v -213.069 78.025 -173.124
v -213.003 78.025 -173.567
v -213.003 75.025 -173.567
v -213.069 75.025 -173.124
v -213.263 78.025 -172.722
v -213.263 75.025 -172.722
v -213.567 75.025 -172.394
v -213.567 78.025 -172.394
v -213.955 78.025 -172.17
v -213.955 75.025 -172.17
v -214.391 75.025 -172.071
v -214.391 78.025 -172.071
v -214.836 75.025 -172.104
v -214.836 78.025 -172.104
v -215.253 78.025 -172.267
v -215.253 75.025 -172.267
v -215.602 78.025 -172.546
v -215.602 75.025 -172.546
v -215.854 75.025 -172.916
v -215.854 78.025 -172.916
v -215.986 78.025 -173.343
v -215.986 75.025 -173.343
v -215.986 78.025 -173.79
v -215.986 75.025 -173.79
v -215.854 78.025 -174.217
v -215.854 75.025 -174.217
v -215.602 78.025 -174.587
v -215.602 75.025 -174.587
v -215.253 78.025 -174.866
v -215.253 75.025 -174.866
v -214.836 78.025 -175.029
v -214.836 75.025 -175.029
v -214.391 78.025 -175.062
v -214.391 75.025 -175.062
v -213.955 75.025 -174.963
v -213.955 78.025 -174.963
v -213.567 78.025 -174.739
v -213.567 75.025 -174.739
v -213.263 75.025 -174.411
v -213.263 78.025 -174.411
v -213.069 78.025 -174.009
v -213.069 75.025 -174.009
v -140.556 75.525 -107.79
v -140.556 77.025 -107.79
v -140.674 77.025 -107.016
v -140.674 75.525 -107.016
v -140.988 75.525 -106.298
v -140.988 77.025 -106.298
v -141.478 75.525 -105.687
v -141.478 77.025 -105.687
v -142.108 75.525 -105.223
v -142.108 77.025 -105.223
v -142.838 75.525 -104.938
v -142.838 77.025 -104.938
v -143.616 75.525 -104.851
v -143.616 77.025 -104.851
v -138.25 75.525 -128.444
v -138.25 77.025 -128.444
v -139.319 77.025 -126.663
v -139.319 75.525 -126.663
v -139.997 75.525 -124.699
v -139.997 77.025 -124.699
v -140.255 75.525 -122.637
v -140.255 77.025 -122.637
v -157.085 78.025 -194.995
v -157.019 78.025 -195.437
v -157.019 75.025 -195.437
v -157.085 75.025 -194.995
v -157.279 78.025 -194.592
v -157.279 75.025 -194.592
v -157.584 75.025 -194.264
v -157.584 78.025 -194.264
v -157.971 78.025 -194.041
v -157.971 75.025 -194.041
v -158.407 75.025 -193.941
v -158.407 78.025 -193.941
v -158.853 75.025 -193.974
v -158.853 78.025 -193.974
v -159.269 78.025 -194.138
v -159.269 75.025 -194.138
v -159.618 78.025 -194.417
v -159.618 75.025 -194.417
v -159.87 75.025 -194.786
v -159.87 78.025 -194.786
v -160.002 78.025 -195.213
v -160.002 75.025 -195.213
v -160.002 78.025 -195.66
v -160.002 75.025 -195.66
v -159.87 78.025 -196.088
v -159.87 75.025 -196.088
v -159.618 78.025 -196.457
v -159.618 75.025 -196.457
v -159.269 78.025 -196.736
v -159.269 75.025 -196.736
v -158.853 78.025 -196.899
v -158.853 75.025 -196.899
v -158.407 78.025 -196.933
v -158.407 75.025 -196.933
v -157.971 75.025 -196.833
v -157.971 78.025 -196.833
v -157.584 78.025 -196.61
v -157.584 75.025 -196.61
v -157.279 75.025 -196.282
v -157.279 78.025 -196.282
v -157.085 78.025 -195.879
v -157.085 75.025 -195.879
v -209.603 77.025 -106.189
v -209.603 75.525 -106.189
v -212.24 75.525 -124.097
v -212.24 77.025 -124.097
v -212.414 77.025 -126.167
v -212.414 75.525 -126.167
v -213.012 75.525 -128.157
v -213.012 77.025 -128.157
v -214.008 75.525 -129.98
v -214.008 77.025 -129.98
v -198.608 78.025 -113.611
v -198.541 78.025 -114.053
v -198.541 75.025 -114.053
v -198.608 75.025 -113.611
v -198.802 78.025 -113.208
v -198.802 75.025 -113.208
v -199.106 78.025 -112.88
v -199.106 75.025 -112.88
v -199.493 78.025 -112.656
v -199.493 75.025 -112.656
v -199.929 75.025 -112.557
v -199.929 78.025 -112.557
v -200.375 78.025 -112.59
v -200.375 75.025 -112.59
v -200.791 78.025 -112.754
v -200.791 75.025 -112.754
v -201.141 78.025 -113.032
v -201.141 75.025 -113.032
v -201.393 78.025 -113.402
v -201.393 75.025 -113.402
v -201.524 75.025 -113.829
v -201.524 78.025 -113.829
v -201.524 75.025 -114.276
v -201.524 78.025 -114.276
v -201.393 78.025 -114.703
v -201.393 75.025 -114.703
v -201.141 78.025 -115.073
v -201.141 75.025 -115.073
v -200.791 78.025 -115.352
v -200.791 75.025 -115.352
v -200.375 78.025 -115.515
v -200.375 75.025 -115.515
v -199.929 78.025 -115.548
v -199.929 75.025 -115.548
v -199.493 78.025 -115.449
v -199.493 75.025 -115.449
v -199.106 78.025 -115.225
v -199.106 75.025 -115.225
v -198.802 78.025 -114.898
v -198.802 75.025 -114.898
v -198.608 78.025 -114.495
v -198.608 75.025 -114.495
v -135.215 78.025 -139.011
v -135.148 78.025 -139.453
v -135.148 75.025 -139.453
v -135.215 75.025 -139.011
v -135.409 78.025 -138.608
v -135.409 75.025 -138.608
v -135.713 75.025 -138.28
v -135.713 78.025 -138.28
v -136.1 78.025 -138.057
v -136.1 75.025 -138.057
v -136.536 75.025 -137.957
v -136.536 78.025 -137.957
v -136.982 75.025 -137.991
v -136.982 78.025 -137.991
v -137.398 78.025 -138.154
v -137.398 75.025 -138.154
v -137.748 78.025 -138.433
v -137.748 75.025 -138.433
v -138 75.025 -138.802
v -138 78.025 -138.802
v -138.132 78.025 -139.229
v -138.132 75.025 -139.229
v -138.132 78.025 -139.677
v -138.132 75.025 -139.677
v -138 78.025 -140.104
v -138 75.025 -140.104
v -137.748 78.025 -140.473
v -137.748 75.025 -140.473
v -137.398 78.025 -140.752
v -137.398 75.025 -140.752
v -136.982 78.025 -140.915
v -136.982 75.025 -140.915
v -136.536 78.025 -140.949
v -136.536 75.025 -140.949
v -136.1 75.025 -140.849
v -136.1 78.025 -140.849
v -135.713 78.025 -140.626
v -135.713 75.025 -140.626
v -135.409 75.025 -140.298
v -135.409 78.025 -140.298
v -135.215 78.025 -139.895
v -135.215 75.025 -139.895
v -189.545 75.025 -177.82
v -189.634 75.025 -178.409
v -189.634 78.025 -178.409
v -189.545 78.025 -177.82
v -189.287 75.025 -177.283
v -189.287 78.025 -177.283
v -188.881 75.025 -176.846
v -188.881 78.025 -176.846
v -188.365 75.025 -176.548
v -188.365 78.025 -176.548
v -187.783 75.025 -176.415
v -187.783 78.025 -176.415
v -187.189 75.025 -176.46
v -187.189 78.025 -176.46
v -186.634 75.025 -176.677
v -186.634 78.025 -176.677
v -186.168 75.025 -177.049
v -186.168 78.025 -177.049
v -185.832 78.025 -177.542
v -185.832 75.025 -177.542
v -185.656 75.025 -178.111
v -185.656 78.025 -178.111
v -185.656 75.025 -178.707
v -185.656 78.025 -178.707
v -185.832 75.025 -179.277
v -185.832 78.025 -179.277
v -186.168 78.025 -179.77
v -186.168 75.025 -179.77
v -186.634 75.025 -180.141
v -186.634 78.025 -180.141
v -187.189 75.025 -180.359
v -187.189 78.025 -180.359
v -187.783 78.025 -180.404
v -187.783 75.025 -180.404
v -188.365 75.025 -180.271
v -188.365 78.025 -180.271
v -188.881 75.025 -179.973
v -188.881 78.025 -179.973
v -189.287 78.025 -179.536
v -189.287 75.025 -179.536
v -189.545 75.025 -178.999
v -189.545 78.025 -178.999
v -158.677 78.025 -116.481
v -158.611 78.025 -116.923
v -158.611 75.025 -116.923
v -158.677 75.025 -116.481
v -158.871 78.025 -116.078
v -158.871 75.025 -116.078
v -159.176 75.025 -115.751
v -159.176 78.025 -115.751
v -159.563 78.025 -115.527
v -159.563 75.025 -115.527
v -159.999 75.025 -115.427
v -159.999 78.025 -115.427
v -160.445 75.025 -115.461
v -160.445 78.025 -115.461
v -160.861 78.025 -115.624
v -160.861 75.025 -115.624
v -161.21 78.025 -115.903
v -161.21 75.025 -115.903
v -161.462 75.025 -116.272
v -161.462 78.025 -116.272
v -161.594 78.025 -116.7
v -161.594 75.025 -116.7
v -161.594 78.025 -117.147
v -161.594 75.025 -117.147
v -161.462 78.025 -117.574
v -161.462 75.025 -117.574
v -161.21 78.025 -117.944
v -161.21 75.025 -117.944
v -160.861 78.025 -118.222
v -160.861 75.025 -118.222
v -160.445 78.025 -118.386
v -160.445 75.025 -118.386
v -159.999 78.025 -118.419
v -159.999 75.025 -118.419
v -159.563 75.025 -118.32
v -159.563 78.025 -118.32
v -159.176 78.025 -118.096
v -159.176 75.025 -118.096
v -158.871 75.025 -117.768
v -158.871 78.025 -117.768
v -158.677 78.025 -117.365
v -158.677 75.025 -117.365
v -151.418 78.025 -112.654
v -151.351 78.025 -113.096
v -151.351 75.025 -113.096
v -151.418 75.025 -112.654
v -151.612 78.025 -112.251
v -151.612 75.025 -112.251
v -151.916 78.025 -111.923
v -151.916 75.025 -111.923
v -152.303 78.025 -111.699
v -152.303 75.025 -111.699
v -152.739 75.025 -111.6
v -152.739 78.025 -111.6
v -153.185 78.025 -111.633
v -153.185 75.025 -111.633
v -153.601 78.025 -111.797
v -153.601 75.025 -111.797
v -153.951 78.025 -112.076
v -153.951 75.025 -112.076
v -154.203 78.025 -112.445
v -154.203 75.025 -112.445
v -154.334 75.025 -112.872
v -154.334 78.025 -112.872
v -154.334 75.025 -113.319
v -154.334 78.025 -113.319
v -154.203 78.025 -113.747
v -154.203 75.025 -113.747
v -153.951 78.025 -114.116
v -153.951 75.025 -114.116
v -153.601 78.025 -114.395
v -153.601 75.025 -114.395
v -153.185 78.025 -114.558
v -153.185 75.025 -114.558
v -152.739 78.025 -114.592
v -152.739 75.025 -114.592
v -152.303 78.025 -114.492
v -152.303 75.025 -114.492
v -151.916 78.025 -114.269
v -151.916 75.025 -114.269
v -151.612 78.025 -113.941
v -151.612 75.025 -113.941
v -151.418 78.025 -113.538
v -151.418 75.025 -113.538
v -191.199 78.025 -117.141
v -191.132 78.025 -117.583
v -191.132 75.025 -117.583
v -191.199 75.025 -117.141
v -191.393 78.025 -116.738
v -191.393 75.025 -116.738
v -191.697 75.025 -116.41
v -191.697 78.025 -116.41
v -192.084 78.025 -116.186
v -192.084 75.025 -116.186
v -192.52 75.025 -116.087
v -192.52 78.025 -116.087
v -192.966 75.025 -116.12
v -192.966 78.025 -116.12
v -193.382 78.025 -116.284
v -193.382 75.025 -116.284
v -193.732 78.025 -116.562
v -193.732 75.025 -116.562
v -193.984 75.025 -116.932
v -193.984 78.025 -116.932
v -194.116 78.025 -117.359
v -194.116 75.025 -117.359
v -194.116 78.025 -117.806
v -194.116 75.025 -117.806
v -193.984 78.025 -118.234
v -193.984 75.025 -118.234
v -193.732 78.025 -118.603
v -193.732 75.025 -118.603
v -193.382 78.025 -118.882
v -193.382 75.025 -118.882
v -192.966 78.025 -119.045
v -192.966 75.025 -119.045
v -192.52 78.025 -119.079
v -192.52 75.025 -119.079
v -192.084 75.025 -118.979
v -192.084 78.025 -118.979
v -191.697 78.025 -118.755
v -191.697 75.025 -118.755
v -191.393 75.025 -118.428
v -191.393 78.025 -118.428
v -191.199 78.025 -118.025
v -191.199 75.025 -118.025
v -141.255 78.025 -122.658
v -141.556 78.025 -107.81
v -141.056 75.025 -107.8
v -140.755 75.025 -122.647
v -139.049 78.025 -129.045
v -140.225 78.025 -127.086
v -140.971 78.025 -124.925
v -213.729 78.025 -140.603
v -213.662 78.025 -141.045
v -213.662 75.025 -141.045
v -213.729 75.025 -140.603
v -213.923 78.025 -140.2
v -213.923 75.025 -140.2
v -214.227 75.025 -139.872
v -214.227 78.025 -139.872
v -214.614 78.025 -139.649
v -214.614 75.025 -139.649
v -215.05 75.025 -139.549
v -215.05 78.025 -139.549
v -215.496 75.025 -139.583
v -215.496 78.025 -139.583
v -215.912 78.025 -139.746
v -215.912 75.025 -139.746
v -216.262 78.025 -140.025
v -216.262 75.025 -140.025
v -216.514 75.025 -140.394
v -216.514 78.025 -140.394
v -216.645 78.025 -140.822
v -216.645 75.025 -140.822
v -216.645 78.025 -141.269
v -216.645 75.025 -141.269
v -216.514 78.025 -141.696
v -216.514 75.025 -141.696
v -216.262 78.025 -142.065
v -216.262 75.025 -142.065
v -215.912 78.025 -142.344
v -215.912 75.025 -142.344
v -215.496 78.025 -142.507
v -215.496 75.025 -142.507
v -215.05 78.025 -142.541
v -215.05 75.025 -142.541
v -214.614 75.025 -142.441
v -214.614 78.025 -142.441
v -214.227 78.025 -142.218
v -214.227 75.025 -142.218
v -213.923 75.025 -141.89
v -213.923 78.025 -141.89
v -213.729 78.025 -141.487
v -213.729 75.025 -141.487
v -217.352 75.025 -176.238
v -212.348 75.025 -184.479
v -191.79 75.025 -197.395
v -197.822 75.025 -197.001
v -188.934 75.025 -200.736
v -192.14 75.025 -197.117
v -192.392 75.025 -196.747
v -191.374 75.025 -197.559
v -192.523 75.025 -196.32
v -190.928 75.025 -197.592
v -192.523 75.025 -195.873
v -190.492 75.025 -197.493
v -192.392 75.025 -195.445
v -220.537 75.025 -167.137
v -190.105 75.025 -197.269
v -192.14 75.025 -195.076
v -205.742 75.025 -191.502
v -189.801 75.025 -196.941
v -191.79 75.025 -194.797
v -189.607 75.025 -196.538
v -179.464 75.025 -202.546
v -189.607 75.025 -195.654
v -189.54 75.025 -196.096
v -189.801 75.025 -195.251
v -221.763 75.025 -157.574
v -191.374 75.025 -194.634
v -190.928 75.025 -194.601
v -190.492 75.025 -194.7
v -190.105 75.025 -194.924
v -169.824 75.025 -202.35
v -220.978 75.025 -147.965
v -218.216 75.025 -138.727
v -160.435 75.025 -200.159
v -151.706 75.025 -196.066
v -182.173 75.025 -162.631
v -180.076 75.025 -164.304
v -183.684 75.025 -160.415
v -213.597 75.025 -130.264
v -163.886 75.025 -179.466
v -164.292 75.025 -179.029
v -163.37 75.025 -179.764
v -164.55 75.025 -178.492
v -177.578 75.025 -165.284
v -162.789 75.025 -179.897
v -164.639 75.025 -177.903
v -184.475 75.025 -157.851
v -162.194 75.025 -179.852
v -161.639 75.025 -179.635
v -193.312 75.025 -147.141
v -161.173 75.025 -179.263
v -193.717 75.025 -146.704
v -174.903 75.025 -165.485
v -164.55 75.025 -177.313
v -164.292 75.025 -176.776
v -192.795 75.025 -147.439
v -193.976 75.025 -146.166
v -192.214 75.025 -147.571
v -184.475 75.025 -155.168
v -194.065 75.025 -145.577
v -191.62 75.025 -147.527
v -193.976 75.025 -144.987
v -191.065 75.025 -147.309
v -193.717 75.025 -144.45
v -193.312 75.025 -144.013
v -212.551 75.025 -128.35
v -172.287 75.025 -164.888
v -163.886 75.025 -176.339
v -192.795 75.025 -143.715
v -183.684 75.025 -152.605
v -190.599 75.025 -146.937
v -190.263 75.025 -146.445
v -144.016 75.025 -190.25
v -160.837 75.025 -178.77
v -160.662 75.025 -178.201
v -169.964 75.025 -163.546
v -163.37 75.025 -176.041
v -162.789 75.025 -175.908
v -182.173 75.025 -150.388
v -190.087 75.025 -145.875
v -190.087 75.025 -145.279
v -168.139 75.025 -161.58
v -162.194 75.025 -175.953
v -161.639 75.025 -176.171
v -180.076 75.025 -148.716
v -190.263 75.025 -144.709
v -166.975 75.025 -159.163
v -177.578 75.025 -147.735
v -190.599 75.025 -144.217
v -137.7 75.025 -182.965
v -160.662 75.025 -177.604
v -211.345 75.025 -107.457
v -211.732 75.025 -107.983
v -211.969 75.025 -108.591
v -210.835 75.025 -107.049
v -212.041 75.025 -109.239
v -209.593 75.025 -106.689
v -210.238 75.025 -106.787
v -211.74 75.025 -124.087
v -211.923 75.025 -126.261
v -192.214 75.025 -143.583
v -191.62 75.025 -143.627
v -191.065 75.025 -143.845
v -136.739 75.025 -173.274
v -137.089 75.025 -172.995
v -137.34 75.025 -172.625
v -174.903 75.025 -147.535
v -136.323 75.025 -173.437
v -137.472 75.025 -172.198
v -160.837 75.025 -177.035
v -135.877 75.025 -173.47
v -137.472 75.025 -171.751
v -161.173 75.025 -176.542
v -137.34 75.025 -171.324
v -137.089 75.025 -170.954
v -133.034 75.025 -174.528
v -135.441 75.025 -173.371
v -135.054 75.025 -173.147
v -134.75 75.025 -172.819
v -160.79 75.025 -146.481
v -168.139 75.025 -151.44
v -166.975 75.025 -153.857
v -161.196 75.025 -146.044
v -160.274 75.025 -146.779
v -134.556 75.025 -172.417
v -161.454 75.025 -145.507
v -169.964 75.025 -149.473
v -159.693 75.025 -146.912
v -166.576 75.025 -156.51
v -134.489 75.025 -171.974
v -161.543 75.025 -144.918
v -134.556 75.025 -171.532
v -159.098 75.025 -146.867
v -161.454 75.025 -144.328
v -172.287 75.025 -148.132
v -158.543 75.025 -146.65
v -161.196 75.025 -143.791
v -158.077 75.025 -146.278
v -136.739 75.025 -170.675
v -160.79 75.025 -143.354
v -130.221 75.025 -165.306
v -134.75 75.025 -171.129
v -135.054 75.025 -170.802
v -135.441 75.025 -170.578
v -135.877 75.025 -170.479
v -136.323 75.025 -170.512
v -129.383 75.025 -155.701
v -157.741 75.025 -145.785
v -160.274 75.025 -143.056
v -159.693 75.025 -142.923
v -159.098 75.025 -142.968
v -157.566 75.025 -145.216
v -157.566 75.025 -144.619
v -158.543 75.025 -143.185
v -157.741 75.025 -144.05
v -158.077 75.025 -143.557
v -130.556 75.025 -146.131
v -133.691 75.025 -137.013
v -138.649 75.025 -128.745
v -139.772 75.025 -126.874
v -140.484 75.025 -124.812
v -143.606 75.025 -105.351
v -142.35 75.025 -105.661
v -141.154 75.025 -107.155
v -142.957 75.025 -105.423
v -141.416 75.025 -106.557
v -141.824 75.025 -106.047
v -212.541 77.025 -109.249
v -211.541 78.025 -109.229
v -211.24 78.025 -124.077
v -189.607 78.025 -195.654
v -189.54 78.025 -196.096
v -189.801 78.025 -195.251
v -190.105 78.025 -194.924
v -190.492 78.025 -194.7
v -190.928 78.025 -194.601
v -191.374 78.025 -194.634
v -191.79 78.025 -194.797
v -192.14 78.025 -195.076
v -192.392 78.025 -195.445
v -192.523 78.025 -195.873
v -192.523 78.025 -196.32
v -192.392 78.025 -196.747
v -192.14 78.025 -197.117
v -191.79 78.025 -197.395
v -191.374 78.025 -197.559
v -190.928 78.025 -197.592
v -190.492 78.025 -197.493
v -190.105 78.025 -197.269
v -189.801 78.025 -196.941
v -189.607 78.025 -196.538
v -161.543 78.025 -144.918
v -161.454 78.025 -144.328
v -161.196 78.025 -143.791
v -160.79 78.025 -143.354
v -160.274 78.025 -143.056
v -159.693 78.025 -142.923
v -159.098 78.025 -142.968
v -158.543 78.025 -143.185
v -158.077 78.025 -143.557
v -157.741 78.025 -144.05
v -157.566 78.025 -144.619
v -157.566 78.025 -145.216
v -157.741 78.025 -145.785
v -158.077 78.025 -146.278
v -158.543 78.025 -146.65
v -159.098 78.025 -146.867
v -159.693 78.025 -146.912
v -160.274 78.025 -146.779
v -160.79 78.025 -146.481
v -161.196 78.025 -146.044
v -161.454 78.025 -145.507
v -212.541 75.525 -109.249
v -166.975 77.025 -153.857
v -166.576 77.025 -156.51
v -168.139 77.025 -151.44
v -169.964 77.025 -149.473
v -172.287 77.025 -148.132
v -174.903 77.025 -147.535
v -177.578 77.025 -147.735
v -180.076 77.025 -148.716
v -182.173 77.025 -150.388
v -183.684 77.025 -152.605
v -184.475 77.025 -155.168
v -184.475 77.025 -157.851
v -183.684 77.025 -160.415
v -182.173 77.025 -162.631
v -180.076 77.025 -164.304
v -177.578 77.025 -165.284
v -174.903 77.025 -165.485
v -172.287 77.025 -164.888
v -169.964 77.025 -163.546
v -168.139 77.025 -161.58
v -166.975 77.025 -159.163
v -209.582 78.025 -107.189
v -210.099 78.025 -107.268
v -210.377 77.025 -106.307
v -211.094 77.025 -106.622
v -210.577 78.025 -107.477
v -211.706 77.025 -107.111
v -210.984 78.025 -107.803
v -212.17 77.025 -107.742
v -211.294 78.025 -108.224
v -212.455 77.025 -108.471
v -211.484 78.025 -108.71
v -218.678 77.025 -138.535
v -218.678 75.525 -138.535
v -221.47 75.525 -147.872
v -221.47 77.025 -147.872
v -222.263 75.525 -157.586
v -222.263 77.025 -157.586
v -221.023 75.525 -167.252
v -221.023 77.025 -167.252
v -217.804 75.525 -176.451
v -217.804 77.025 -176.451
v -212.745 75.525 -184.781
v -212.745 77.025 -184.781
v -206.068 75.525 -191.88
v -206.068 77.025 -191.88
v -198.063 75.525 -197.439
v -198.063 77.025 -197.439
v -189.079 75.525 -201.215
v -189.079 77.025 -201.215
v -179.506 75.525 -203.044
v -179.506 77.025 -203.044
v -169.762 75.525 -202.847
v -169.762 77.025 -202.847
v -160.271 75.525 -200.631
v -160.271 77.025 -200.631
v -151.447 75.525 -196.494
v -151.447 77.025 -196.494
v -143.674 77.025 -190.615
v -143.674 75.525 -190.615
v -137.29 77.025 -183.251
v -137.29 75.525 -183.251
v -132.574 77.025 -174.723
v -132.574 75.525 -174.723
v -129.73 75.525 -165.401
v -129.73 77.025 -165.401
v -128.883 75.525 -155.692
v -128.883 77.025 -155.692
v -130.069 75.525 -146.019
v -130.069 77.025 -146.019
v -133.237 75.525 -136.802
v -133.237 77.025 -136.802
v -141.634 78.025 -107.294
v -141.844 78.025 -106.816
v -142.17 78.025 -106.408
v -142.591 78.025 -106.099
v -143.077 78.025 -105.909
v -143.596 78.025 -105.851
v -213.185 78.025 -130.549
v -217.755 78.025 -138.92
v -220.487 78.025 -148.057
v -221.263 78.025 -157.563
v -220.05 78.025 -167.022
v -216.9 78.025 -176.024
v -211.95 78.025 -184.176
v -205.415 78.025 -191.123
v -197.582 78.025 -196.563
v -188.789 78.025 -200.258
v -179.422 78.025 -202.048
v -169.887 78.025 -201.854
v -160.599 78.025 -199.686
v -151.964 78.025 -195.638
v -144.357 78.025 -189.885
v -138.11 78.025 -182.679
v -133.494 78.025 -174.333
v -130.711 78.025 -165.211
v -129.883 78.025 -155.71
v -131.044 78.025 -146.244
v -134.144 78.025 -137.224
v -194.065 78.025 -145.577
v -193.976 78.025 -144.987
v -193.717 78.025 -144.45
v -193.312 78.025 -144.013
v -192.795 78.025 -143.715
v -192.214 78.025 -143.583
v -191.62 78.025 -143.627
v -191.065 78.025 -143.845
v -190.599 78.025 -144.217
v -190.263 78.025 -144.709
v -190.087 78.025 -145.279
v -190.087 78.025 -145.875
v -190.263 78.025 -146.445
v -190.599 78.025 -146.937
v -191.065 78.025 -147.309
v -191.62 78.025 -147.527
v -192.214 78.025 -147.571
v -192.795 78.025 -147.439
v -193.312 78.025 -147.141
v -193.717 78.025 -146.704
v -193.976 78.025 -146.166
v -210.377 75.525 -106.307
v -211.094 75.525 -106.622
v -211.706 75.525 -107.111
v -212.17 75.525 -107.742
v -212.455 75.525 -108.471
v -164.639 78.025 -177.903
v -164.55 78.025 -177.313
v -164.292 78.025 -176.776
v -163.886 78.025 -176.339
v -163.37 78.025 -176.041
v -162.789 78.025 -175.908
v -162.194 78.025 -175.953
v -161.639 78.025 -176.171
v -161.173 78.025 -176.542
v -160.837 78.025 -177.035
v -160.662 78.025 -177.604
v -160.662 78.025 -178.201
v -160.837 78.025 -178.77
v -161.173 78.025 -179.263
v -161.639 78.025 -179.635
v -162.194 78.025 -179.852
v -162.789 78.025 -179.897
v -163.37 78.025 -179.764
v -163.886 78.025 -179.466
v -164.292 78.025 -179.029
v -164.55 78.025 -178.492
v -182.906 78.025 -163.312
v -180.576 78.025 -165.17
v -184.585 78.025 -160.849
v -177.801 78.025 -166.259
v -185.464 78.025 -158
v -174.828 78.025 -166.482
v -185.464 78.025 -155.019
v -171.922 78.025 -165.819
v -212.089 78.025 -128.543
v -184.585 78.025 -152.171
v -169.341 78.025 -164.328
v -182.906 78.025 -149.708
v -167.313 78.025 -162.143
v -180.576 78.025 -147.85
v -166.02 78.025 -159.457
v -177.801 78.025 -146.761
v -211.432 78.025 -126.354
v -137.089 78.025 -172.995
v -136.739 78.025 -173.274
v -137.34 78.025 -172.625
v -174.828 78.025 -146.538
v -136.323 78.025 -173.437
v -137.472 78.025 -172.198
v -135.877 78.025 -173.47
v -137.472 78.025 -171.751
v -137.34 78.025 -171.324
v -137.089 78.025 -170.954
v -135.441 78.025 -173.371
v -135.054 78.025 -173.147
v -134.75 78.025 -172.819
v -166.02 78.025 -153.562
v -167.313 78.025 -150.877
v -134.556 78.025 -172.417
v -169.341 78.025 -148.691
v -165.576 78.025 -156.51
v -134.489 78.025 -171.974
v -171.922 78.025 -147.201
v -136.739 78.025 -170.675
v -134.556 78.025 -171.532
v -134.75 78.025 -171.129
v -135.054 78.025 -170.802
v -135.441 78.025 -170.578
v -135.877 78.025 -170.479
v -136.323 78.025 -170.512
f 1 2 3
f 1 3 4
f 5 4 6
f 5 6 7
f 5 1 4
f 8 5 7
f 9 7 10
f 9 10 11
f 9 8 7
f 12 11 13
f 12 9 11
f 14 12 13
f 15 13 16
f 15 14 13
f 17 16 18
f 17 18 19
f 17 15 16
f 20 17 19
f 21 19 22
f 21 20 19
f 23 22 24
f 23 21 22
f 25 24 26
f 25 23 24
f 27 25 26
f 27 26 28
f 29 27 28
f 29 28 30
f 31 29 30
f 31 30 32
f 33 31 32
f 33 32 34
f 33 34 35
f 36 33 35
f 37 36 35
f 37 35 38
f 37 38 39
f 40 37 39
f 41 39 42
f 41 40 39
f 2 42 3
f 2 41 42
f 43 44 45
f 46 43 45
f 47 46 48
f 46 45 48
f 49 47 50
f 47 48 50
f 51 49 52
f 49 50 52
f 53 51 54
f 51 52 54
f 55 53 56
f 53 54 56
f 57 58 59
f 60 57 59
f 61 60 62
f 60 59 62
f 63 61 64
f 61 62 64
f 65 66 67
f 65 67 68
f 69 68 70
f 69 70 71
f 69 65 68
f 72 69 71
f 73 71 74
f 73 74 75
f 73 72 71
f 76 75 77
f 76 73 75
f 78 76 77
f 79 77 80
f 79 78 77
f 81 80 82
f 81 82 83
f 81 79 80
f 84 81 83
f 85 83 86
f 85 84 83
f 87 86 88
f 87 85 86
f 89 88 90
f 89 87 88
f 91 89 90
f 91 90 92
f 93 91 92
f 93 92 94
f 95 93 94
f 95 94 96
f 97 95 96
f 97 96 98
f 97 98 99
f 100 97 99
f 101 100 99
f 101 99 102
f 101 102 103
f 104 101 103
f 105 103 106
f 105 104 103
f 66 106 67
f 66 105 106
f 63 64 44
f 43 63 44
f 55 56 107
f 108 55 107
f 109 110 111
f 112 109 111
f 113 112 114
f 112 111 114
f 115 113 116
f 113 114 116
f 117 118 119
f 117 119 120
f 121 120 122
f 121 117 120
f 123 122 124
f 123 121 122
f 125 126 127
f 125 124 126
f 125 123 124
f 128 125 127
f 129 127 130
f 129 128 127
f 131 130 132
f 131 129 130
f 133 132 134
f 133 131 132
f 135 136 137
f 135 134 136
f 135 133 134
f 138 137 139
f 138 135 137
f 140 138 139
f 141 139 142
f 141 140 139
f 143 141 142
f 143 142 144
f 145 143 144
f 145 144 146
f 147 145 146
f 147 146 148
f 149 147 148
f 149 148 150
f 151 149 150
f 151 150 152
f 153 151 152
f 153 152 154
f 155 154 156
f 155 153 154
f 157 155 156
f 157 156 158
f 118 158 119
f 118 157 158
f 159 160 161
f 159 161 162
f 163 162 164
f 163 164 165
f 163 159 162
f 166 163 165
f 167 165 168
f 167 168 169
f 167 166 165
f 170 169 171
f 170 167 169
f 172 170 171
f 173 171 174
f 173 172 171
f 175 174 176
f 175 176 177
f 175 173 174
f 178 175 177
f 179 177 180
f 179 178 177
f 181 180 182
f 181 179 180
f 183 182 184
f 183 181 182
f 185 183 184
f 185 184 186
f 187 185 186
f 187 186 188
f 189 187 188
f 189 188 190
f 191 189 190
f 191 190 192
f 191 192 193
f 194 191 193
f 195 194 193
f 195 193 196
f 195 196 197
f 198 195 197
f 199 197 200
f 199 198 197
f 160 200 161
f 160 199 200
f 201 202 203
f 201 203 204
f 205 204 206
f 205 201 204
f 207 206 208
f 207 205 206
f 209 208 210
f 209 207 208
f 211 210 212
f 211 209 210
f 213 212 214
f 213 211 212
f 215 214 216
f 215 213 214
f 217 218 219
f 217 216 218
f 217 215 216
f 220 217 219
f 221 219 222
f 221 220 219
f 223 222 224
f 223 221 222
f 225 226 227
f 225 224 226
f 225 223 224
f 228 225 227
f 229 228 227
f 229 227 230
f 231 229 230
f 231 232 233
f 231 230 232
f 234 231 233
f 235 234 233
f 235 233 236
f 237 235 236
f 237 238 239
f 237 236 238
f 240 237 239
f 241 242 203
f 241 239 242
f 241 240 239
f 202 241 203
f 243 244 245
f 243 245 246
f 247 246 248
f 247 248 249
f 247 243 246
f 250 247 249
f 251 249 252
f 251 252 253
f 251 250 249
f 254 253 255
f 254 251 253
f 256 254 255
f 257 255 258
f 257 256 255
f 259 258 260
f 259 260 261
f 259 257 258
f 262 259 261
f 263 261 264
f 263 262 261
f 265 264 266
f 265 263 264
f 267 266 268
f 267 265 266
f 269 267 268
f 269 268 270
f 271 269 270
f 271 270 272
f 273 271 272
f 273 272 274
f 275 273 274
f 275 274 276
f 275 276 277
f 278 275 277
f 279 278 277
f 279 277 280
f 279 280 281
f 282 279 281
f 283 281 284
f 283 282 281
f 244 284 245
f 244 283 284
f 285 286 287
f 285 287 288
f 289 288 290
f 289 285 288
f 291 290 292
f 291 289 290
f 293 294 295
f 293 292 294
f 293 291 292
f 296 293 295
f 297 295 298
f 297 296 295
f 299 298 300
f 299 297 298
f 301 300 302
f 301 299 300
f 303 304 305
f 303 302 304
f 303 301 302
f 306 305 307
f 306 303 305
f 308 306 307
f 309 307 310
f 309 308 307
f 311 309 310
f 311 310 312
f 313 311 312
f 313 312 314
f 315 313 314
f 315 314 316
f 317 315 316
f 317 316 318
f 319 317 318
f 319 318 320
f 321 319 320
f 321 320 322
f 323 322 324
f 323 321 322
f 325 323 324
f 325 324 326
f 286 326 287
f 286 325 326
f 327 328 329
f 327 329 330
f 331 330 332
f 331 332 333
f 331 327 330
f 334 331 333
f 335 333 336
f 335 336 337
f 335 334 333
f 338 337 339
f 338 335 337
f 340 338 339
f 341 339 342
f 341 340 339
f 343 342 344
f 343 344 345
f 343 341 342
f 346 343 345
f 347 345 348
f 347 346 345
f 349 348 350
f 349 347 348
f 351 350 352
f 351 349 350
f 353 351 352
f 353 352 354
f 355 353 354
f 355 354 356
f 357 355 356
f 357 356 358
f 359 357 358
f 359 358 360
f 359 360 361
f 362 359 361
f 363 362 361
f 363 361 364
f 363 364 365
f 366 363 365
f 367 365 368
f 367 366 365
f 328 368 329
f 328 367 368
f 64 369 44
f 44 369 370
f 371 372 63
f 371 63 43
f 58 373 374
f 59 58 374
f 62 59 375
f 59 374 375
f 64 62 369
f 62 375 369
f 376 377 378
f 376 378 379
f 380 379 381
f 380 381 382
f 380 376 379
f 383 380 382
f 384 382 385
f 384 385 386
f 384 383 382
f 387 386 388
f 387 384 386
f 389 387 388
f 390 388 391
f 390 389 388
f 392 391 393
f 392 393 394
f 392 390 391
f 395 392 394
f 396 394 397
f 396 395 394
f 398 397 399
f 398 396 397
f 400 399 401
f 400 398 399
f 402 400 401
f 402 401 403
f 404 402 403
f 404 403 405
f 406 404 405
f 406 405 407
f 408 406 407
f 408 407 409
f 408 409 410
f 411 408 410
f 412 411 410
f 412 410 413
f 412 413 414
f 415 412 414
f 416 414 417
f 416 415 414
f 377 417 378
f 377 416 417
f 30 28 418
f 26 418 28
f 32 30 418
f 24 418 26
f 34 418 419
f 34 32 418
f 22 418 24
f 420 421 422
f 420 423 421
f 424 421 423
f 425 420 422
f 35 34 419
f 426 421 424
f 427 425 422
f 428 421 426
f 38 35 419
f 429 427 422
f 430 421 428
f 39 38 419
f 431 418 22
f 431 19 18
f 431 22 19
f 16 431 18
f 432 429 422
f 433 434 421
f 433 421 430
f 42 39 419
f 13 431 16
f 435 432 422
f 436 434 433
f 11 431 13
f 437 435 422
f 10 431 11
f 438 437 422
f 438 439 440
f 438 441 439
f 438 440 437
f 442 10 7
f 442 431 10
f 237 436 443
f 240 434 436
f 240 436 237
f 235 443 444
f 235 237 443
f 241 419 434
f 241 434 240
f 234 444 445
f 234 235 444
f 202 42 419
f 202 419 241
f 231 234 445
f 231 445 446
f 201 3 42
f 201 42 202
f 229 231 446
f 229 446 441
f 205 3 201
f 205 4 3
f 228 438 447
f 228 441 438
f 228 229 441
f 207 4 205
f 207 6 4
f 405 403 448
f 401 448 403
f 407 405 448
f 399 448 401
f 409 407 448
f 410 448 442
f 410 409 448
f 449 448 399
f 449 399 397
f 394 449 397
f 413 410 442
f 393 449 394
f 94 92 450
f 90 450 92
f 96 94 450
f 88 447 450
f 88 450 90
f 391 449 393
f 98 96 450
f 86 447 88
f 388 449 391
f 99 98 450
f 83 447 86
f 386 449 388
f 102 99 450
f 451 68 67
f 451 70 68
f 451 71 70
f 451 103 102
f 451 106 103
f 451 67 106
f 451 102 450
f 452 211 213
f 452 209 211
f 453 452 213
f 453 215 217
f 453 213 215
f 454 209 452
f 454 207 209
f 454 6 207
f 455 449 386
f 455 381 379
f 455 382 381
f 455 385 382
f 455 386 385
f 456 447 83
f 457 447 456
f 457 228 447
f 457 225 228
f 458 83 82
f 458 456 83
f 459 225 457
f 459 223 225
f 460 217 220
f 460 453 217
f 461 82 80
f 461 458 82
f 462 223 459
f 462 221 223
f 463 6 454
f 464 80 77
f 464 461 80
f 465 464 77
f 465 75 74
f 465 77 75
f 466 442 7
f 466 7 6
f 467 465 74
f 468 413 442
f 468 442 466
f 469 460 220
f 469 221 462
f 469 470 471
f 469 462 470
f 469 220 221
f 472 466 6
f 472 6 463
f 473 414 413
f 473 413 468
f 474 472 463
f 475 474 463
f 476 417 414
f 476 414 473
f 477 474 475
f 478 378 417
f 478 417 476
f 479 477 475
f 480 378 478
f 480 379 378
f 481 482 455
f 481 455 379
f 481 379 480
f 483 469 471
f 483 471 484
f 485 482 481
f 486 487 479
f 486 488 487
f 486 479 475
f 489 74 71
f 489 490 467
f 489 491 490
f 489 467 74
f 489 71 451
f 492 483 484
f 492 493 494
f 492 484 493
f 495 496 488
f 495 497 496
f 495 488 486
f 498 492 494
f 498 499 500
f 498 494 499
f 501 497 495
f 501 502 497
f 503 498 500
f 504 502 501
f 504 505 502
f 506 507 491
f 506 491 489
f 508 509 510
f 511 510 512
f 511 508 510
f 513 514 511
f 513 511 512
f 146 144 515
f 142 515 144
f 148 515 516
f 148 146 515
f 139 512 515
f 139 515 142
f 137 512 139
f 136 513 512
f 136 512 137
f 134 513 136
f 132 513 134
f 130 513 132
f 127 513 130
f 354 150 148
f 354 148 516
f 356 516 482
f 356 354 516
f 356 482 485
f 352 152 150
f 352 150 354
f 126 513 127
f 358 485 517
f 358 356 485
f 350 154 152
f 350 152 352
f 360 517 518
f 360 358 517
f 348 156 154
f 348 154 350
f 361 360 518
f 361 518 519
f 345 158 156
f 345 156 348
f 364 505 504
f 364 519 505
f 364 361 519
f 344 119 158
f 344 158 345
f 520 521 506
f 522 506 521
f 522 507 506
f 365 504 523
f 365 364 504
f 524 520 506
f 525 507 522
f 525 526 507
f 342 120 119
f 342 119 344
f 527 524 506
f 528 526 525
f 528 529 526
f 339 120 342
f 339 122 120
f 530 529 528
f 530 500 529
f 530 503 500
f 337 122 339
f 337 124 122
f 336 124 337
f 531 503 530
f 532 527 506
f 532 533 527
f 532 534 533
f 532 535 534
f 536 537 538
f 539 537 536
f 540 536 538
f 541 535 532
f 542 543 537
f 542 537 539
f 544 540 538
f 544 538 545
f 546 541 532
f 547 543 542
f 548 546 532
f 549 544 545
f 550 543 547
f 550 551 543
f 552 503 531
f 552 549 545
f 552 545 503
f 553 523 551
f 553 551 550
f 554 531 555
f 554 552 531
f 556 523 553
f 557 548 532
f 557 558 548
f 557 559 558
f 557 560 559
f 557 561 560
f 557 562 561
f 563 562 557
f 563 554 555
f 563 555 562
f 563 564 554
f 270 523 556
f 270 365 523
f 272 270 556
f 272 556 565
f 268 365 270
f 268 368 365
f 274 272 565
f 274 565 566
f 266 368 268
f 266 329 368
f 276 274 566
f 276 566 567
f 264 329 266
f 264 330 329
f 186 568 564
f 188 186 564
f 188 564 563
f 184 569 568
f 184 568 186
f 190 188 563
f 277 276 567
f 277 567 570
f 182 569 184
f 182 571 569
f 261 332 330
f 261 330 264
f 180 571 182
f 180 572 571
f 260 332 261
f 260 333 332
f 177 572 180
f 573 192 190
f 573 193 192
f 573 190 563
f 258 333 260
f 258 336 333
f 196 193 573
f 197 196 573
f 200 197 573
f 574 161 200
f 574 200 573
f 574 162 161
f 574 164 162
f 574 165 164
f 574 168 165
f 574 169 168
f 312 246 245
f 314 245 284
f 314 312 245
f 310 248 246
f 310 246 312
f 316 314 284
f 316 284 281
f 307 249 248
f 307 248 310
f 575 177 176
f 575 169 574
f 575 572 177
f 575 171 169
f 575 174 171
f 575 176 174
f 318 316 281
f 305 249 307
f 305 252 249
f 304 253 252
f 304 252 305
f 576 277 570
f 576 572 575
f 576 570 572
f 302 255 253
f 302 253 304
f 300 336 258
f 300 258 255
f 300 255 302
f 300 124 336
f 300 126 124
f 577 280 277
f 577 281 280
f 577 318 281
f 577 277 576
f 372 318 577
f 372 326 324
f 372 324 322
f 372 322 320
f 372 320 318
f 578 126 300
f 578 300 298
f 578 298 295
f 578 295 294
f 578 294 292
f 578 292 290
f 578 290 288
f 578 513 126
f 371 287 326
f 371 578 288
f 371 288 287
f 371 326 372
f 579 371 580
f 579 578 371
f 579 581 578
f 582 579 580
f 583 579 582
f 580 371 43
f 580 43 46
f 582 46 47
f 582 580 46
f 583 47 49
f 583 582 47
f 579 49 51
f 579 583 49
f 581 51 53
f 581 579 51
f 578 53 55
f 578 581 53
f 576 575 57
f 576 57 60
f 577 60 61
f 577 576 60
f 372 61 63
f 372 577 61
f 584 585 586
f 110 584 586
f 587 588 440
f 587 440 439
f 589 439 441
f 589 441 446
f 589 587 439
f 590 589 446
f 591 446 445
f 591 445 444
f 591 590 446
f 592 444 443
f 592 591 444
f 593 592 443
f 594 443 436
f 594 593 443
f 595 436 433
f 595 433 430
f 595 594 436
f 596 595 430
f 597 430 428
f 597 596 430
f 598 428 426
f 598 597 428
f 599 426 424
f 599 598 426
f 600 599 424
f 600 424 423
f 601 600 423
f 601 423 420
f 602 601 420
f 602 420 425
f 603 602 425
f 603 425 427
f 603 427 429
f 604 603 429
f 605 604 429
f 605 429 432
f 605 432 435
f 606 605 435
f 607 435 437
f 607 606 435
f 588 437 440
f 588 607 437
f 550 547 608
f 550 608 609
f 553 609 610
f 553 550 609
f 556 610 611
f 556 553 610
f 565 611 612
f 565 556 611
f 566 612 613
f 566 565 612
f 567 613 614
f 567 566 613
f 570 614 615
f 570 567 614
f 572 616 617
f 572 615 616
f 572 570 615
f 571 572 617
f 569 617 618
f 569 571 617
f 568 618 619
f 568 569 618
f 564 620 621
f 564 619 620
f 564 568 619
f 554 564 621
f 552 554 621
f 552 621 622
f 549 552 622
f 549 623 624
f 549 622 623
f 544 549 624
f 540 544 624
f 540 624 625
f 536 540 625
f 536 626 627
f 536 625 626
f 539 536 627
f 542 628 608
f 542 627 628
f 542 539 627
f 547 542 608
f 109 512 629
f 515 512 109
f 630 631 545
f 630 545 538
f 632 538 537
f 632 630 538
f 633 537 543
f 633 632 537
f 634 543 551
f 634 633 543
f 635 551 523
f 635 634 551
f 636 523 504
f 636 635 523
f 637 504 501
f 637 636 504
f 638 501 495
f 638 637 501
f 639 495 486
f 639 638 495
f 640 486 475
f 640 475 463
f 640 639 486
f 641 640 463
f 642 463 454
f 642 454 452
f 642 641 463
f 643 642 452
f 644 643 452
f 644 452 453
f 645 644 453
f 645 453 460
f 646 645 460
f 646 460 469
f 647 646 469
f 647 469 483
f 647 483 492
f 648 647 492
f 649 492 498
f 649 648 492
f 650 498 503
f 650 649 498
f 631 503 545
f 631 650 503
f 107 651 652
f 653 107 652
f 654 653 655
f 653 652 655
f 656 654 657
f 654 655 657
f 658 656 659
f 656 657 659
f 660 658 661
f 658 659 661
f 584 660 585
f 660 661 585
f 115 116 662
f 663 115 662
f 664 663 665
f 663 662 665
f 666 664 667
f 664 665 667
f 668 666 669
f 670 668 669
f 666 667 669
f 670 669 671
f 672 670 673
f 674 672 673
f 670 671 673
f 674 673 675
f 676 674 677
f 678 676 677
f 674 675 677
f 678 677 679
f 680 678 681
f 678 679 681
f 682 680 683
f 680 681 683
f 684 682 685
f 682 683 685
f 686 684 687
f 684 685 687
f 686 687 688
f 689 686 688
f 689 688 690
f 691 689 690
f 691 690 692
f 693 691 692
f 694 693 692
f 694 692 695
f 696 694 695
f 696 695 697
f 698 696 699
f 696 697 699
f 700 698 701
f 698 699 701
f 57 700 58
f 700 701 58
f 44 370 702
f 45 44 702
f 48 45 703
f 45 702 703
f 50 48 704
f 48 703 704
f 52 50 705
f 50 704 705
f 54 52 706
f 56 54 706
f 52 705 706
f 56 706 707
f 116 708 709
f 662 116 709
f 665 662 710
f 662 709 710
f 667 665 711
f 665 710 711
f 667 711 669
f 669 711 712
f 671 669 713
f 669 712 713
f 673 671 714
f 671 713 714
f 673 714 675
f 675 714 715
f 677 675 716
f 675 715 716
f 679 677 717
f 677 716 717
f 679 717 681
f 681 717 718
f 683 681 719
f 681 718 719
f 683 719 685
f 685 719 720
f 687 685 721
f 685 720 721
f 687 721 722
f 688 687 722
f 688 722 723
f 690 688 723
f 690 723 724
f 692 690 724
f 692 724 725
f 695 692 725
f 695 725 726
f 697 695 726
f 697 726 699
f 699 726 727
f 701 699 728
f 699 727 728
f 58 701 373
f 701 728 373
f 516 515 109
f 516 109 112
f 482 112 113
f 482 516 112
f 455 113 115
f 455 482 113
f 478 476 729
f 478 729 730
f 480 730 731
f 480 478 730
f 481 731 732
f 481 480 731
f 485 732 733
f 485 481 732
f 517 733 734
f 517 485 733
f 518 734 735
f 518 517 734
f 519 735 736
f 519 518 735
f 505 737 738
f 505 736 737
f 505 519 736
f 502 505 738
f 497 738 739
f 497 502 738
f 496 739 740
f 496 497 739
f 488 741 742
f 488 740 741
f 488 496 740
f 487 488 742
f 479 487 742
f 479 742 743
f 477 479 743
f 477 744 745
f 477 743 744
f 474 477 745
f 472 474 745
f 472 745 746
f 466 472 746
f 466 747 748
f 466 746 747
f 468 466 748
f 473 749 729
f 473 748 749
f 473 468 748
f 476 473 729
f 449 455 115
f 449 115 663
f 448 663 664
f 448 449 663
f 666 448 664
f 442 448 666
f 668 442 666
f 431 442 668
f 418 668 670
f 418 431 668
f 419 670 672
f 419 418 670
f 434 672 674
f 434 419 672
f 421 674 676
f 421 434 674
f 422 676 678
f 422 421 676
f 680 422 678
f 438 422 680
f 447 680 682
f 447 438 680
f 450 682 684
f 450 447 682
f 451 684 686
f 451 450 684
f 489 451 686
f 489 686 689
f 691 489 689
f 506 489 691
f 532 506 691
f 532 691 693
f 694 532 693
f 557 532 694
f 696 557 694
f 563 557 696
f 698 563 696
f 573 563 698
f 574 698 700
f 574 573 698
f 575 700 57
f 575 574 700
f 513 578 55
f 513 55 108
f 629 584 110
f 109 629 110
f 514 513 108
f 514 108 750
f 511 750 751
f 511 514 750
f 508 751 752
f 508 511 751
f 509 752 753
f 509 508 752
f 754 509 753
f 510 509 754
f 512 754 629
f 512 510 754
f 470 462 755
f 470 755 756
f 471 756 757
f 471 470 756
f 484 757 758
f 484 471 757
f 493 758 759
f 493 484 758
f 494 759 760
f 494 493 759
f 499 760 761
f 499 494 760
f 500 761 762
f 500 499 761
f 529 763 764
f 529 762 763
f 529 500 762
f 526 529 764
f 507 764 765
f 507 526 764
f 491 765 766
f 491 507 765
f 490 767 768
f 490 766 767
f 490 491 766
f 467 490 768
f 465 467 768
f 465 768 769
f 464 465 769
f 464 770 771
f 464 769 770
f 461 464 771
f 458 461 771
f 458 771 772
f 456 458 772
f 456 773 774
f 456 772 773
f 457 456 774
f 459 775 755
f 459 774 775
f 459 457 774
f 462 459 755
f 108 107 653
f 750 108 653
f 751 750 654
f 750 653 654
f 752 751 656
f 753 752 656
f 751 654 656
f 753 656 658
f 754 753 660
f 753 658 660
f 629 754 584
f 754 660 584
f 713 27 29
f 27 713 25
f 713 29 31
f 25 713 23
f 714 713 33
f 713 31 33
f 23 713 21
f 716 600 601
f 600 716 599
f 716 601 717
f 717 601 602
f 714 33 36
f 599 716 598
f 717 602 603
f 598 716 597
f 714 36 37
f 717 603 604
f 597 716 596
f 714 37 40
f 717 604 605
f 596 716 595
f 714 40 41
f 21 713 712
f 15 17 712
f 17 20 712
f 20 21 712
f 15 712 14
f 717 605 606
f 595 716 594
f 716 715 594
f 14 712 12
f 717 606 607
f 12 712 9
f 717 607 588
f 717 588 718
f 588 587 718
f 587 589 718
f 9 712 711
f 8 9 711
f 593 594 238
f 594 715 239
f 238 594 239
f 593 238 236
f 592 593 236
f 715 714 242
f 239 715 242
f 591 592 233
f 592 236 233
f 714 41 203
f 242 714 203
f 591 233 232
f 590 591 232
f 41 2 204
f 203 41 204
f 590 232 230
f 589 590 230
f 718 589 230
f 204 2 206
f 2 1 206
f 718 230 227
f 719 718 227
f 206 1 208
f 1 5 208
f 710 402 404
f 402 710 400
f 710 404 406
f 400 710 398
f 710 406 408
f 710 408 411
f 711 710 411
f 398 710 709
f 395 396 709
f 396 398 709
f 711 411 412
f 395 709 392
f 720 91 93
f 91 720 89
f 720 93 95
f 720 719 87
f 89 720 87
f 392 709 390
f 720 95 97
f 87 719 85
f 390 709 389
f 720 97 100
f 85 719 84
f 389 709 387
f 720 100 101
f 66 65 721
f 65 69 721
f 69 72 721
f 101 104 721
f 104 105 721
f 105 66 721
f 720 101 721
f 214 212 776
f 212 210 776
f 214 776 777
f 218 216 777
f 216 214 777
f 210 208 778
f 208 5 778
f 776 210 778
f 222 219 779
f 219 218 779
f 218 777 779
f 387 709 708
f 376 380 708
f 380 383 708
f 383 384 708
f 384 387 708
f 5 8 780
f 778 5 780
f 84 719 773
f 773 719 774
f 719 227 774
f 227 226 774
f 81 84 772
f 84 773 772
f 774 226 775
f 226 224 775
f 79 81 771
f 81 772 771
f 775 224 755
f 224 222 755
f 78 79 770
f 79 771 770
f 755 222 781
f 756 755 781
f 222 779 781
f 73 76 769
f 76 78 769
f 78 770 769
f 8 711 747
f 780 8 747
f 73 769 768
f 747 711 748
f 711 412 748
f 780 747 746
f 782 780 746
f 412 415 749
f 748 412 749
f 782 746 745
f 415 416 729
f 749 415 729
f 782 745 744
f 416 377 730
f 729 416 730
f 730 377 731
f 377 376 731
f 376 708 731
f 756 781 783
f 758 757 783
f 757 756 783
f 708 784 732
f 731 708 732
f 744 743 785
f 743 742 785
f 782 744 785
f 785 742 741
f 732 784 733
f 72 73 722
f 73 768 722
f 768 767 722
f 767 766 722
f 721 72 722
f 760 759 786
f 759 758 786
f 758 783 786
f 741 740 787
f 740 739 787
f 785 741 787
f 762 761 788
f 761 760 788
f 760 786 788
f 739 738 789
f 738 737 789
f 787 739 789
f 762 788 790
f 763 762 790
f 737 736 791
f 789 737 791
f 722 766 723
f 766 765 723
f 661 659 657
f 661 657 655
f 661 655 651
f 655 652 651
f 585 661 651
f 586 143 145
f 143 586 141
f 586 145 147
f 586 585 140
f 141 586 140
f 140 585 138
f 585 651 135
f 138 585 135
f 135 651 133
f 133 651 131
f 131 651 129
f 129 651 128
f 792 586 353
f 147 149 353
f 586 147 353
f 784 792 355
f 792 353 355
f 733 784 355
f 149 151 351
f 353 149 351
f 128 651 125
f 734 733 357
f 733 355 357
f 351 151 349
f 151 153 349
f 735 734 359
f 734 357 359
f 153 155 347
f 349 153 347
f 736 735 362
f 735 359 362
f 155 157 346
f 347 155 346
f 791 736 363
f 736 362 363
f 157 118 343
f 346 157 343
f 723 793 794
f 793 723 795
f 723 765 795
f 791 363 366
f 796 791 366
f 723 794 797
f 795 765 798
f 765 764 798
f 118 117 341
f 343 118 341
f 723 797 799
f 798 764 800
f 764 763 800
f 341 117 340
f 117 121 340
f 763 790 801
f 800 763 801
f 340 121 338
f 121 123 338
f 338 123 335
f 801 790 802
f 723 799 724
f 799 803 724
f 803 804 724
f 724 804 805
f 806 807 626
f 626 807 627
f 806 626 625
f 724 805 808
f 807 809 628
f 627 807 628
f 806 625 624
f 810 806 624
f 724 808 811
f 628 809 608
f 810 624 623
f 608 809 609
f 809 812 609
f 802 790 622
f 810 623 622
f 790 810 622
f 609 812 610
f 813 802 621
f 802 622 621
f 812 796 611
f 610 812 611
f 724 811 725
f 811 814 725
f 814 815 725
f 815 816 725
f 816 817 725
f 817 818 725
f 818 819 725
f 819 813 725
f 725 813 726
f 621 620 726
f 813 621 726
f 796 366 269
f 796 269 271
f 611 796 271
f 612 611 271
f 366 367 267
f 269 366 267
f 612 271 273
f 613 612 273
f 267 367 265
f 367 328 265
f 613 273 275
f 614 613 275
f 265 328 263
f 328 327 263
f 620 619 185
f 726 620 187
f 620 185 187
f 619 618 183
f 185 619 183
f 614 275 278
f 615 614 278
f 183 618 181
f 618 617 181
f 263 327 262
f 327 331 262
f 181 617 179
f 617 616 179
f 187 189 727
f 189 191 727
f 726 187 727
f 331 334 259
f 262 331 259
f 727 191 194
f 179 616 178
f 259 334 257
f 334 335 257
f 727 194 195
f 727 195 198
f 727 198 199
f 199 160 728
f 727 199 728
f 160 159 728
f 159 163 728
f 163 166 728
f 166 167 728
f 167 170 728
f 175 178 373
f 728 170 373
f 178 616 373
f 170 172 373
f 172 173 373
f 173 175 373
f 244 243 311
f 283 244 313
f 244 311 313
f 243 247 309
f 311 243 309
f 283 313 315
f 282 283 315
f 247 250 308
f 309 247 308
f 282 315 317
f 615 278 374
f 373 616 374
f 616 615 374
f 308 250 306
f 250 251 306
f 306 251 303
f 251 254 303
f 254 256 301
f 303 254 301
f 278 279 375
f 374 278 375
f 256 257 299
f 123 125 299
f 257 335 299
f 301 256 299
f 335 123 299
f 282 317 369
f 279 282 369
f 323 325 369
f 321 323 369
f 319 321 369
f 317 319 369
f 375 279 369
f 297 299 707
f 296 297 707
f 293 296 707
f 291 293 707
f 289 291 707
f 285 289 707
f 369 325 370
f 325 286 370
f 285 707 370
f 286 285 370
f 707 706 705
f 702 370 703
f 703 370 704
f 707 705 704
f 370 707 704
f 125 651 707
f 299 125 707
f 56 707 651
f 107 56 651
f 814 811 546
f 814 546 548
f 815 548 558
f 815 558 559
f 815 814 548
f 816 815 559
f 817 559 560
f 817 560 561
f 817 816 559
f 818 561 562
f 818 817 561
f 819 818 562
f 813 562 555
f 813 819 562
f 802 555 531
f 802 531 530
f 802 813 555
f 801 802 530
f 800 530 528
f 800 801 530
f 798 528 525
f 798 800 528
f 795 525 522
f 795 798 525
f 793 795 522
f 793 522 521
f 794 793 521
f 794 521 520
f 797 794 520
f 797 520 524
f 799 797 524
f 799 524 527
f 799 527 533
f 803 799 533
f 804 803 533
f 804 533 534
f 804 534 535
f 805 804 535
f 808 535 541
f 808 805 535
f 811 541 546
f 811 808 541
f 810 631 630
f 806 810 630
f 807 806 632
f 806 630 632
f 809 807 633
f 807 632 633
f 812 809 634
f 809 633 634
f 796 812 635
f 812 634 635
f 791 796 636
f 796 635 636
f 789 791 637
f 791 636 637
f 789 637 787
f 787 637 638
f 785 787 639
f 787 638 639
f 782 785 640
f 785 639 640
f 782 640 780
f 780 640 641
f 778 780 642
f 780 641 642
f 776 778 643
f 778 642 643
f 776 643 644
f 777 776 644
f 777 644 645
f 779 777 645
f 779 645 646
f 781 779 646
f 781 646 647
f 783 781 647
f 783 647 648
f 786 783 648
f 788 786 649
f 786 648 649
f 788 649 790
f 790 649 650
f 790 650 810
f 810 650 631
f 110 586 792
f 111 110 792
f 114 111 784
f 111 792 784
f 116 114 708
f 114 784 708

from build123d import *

# Parameters (mm, degrees)
SKETCH_1_R               = 1.5
SKETCH_1_R_2             = 9
EXTRUDE_1_DEPTH          = 3
CHAMFER_1_SIZE           = 0.5
CUT_EXTRUDE_1_DEPTH      = 302.180394913
CUT_EXTRUDE_1_DEPTH_BACK = 302.180394913
SKETCH_3_R               = 1.5
CUT_EXTRUDE_2_DEPTH      = 302.180394913
CUT_EXTRUDE_2_DEPTH_BACK = 302.180394913
SKETCH_4_R               = 2
CHAMFER_2_SIZE           = 1
CUT_EXTRUDE_3_DEPTH      = 302.180394913
CUT_EXTRUDE_3_DEPTH_BACK = 302.180394913
SKETCH_5_R               = 1.5


with BuildPart() as part:
    # 草图1 → 凸台-拉伸1 (new body)
    with BuildSketch(Plane.XZ.offset(-78.025173071)):
        with BuildLine():
            Line((-212.541244563, -109.249486882), (-212.240178336, -124.096924988))
            ThreePointArc((-212.240178336, -124.096924988), (-212.661273384, -127.177841531), (-214.008389255, -129.980455778))
            ThreePointArc((-214.008389255, -129.980455778), (-174.628775953, -203.200190572), (-138.249712047, -128.44427297))
            ThreePointArc((-138.249712047, -128.44427297), (-139.709332875, -125.698571817), (-140.25497588, -122.637258129))
            Line((-140.25497588, -122.637258129), (-140.556042107, -107.789820023))
            ThreePointArc((-140.556042107, -107.789820023), (-141.477547023, -105.686749262), (-143.616244995, -104.85125604))
            Line((-143.616244995, -104.85125604), (-209.60268058, -106.189283994))
            ThreePointArc((-209.60268058, -106.189283994), (-211.705751342, -107.11078891), (-212.541244563, -109.249486882))
        make_face()
        with Locations((-136.648445194, -139.453062321)):
            Circle(SKETCH_1_R, mode=Mode.SUBTRACT)
        with Locations((-175.575532096, -156.509788424)):
            Circle(SKETCH_1_R_2, mode=Mode.SUBTRACT)
        with Locations((-135.988998284, -171.974468852)):
            Circle(SKETCH_1_R, mode=Mode.SUBTRACT)
        with Locations((-191.040212525, -196.096322235)):
            Circle(SKETCH_1_R, mode=Mode.SUBTRACT)
        with Locations((-215.162065908, -141.045107995)):
            Circle(SKETCH_1_R, mode=Mode.SUBTRACT)
        with Locations((-192.632258198, -117.582701522)):
            Circle(SKETCH_1_R, mode=Mode.SUBTRACT)
        with Locations((-160.110851668, -116.923254612)):
            Circle(SKETCH_1_R, mode=Mode.SUBTRACT)
        with Locations((-214.502618998, -173.566514526)):
            Circle(SKETCH_1_R, mode=Mode.SUBTRACT)
        with Locations((-158.518805994, -195.436875326)):
            Circle(SKETCH_1_R, mode=Mode.SUBTRACT)
    extrude(amount=EXTRUDE_1_DEPTH)

    # 倒角1
    chamfer_1_edges = [part.edges().sort_by_distance(p)[0] for p in [
        (-211.705751339, 75.025173077, -107.110788911),
        (-212.390711447, 75.025173077, -116.673205936),
        (-212.661273381, 75.025173077, -127.177841532),
        (-174.628775951, 75.025173075, -203.200190573),
        (-139.709332873, 75.025173075, -125.698571818),
        (-140.405508991, 75.025173075, -115.213539077),
        (-141.477547021, 75.025173075, -105.686749262),
        (-176.609462785, 75.025173076, -105.520270018),
    ]]
    chamfer(chamfer_1_edges, length=CHAMFER_1_SIZE)

    # 草图3 → 切除-拉伸1 (cut, two sides: drawn at the far end of the back side and taken through both)
    with BuildSketch(Plane.XZ.offset(-75.025173071).offset(-CUT_EXTRUDE_1_DEPTH_BACK)):
        with Locations((-200.041202679, -114.05266186)):
            Circle(SKETCH_3_R)
    extrude(amount=CUT_EXTRUDE_1_DEPTH + CUT_EXTRUDE_1_DEPTH_BACK, mode=Mode.SUBTRACT)

    # 草图4 → 切除-拉伸2 (cut, two sides: drawn at the far end of the back side and taken through both)
    with BuildSketch(Plane(origin=(2e-09, 78.025173071, -1e-09), x_dir=(1.0, -3.1446611841336594e-11, 0), z_dir=(3.1446611841336594e-11, 1.0, -6.574611909583631e-12)).offset(-CUT_EXTRUDE_2_DEPTH_BACK)):
        with Locations(Location((-192.064609975, 145.576946921, 0), (0, 0, 180))):
            Circle(SKETCH_4_R)
        with Locations(Location((-159.543203445, 144.917500011, 0), (0, 0, 180))):
            Circle(SKETCH_4_R)
        with Locations(Location((-187.634036488, 178.409388234, 0), (0, 0, 180))):
            Circle(SKETCH_4_R)
        with Locations(Location((-162.639174524, 177.902559463, 0), (0, 0, 180))):
            Circle(SKETCH_4_R)
    extrude(amount=CUT_EXTRUDE_2_DEPTH + CUT_EXTRUDE_2_DEPTH_BACK, mode=Mode.SUBTRACT)

    # 倒角2
    chamfer_2_edges = [part.edges().sort_by_distance(p)[0] for p in [
        (-212.390711447, 78.025173077, -116.673205936),
        (-211.705751339, 78.025173077, -107.110788911),
        (-176.609462785, 78.025173076, -105.520270018),
        (-141.477547021, 78.025173075, -105.686749262),
        (-184.575532094, 78.025173076, -156.509788424),
        (-140.405508991, 78.025173075, -115.213539077),
        (-139.709332873, 78.025173075, -125.698571818),
        (-174.62877595, 78.025173075, -203.200190573),
        (-212.661273381, 78.025173077, -127.177841532),
    ]]
    chamfer(chamfer_2_edges, length=CHAMFER_2_SIZE)

    # 草图5 → 切除-拉伸3 (cut, two sides: drawn at the far end of the back side and taken through both)
    with BuildSketch(Plane.XZ.offset(-75.025173071).offset(-CUT_EXTRUDE_3_DEPTH_BACK)):
        with Locations((-152.851097985, -113.09577309)):
            Circle(SKETCH_5_R)
    extrude(amount=CUT_EXTRUDE_3_DEPTH + CUT_EXTRUDE_3_DEPTH_BACK, mode=Mode.SUBTRACT)


solid = part.part
